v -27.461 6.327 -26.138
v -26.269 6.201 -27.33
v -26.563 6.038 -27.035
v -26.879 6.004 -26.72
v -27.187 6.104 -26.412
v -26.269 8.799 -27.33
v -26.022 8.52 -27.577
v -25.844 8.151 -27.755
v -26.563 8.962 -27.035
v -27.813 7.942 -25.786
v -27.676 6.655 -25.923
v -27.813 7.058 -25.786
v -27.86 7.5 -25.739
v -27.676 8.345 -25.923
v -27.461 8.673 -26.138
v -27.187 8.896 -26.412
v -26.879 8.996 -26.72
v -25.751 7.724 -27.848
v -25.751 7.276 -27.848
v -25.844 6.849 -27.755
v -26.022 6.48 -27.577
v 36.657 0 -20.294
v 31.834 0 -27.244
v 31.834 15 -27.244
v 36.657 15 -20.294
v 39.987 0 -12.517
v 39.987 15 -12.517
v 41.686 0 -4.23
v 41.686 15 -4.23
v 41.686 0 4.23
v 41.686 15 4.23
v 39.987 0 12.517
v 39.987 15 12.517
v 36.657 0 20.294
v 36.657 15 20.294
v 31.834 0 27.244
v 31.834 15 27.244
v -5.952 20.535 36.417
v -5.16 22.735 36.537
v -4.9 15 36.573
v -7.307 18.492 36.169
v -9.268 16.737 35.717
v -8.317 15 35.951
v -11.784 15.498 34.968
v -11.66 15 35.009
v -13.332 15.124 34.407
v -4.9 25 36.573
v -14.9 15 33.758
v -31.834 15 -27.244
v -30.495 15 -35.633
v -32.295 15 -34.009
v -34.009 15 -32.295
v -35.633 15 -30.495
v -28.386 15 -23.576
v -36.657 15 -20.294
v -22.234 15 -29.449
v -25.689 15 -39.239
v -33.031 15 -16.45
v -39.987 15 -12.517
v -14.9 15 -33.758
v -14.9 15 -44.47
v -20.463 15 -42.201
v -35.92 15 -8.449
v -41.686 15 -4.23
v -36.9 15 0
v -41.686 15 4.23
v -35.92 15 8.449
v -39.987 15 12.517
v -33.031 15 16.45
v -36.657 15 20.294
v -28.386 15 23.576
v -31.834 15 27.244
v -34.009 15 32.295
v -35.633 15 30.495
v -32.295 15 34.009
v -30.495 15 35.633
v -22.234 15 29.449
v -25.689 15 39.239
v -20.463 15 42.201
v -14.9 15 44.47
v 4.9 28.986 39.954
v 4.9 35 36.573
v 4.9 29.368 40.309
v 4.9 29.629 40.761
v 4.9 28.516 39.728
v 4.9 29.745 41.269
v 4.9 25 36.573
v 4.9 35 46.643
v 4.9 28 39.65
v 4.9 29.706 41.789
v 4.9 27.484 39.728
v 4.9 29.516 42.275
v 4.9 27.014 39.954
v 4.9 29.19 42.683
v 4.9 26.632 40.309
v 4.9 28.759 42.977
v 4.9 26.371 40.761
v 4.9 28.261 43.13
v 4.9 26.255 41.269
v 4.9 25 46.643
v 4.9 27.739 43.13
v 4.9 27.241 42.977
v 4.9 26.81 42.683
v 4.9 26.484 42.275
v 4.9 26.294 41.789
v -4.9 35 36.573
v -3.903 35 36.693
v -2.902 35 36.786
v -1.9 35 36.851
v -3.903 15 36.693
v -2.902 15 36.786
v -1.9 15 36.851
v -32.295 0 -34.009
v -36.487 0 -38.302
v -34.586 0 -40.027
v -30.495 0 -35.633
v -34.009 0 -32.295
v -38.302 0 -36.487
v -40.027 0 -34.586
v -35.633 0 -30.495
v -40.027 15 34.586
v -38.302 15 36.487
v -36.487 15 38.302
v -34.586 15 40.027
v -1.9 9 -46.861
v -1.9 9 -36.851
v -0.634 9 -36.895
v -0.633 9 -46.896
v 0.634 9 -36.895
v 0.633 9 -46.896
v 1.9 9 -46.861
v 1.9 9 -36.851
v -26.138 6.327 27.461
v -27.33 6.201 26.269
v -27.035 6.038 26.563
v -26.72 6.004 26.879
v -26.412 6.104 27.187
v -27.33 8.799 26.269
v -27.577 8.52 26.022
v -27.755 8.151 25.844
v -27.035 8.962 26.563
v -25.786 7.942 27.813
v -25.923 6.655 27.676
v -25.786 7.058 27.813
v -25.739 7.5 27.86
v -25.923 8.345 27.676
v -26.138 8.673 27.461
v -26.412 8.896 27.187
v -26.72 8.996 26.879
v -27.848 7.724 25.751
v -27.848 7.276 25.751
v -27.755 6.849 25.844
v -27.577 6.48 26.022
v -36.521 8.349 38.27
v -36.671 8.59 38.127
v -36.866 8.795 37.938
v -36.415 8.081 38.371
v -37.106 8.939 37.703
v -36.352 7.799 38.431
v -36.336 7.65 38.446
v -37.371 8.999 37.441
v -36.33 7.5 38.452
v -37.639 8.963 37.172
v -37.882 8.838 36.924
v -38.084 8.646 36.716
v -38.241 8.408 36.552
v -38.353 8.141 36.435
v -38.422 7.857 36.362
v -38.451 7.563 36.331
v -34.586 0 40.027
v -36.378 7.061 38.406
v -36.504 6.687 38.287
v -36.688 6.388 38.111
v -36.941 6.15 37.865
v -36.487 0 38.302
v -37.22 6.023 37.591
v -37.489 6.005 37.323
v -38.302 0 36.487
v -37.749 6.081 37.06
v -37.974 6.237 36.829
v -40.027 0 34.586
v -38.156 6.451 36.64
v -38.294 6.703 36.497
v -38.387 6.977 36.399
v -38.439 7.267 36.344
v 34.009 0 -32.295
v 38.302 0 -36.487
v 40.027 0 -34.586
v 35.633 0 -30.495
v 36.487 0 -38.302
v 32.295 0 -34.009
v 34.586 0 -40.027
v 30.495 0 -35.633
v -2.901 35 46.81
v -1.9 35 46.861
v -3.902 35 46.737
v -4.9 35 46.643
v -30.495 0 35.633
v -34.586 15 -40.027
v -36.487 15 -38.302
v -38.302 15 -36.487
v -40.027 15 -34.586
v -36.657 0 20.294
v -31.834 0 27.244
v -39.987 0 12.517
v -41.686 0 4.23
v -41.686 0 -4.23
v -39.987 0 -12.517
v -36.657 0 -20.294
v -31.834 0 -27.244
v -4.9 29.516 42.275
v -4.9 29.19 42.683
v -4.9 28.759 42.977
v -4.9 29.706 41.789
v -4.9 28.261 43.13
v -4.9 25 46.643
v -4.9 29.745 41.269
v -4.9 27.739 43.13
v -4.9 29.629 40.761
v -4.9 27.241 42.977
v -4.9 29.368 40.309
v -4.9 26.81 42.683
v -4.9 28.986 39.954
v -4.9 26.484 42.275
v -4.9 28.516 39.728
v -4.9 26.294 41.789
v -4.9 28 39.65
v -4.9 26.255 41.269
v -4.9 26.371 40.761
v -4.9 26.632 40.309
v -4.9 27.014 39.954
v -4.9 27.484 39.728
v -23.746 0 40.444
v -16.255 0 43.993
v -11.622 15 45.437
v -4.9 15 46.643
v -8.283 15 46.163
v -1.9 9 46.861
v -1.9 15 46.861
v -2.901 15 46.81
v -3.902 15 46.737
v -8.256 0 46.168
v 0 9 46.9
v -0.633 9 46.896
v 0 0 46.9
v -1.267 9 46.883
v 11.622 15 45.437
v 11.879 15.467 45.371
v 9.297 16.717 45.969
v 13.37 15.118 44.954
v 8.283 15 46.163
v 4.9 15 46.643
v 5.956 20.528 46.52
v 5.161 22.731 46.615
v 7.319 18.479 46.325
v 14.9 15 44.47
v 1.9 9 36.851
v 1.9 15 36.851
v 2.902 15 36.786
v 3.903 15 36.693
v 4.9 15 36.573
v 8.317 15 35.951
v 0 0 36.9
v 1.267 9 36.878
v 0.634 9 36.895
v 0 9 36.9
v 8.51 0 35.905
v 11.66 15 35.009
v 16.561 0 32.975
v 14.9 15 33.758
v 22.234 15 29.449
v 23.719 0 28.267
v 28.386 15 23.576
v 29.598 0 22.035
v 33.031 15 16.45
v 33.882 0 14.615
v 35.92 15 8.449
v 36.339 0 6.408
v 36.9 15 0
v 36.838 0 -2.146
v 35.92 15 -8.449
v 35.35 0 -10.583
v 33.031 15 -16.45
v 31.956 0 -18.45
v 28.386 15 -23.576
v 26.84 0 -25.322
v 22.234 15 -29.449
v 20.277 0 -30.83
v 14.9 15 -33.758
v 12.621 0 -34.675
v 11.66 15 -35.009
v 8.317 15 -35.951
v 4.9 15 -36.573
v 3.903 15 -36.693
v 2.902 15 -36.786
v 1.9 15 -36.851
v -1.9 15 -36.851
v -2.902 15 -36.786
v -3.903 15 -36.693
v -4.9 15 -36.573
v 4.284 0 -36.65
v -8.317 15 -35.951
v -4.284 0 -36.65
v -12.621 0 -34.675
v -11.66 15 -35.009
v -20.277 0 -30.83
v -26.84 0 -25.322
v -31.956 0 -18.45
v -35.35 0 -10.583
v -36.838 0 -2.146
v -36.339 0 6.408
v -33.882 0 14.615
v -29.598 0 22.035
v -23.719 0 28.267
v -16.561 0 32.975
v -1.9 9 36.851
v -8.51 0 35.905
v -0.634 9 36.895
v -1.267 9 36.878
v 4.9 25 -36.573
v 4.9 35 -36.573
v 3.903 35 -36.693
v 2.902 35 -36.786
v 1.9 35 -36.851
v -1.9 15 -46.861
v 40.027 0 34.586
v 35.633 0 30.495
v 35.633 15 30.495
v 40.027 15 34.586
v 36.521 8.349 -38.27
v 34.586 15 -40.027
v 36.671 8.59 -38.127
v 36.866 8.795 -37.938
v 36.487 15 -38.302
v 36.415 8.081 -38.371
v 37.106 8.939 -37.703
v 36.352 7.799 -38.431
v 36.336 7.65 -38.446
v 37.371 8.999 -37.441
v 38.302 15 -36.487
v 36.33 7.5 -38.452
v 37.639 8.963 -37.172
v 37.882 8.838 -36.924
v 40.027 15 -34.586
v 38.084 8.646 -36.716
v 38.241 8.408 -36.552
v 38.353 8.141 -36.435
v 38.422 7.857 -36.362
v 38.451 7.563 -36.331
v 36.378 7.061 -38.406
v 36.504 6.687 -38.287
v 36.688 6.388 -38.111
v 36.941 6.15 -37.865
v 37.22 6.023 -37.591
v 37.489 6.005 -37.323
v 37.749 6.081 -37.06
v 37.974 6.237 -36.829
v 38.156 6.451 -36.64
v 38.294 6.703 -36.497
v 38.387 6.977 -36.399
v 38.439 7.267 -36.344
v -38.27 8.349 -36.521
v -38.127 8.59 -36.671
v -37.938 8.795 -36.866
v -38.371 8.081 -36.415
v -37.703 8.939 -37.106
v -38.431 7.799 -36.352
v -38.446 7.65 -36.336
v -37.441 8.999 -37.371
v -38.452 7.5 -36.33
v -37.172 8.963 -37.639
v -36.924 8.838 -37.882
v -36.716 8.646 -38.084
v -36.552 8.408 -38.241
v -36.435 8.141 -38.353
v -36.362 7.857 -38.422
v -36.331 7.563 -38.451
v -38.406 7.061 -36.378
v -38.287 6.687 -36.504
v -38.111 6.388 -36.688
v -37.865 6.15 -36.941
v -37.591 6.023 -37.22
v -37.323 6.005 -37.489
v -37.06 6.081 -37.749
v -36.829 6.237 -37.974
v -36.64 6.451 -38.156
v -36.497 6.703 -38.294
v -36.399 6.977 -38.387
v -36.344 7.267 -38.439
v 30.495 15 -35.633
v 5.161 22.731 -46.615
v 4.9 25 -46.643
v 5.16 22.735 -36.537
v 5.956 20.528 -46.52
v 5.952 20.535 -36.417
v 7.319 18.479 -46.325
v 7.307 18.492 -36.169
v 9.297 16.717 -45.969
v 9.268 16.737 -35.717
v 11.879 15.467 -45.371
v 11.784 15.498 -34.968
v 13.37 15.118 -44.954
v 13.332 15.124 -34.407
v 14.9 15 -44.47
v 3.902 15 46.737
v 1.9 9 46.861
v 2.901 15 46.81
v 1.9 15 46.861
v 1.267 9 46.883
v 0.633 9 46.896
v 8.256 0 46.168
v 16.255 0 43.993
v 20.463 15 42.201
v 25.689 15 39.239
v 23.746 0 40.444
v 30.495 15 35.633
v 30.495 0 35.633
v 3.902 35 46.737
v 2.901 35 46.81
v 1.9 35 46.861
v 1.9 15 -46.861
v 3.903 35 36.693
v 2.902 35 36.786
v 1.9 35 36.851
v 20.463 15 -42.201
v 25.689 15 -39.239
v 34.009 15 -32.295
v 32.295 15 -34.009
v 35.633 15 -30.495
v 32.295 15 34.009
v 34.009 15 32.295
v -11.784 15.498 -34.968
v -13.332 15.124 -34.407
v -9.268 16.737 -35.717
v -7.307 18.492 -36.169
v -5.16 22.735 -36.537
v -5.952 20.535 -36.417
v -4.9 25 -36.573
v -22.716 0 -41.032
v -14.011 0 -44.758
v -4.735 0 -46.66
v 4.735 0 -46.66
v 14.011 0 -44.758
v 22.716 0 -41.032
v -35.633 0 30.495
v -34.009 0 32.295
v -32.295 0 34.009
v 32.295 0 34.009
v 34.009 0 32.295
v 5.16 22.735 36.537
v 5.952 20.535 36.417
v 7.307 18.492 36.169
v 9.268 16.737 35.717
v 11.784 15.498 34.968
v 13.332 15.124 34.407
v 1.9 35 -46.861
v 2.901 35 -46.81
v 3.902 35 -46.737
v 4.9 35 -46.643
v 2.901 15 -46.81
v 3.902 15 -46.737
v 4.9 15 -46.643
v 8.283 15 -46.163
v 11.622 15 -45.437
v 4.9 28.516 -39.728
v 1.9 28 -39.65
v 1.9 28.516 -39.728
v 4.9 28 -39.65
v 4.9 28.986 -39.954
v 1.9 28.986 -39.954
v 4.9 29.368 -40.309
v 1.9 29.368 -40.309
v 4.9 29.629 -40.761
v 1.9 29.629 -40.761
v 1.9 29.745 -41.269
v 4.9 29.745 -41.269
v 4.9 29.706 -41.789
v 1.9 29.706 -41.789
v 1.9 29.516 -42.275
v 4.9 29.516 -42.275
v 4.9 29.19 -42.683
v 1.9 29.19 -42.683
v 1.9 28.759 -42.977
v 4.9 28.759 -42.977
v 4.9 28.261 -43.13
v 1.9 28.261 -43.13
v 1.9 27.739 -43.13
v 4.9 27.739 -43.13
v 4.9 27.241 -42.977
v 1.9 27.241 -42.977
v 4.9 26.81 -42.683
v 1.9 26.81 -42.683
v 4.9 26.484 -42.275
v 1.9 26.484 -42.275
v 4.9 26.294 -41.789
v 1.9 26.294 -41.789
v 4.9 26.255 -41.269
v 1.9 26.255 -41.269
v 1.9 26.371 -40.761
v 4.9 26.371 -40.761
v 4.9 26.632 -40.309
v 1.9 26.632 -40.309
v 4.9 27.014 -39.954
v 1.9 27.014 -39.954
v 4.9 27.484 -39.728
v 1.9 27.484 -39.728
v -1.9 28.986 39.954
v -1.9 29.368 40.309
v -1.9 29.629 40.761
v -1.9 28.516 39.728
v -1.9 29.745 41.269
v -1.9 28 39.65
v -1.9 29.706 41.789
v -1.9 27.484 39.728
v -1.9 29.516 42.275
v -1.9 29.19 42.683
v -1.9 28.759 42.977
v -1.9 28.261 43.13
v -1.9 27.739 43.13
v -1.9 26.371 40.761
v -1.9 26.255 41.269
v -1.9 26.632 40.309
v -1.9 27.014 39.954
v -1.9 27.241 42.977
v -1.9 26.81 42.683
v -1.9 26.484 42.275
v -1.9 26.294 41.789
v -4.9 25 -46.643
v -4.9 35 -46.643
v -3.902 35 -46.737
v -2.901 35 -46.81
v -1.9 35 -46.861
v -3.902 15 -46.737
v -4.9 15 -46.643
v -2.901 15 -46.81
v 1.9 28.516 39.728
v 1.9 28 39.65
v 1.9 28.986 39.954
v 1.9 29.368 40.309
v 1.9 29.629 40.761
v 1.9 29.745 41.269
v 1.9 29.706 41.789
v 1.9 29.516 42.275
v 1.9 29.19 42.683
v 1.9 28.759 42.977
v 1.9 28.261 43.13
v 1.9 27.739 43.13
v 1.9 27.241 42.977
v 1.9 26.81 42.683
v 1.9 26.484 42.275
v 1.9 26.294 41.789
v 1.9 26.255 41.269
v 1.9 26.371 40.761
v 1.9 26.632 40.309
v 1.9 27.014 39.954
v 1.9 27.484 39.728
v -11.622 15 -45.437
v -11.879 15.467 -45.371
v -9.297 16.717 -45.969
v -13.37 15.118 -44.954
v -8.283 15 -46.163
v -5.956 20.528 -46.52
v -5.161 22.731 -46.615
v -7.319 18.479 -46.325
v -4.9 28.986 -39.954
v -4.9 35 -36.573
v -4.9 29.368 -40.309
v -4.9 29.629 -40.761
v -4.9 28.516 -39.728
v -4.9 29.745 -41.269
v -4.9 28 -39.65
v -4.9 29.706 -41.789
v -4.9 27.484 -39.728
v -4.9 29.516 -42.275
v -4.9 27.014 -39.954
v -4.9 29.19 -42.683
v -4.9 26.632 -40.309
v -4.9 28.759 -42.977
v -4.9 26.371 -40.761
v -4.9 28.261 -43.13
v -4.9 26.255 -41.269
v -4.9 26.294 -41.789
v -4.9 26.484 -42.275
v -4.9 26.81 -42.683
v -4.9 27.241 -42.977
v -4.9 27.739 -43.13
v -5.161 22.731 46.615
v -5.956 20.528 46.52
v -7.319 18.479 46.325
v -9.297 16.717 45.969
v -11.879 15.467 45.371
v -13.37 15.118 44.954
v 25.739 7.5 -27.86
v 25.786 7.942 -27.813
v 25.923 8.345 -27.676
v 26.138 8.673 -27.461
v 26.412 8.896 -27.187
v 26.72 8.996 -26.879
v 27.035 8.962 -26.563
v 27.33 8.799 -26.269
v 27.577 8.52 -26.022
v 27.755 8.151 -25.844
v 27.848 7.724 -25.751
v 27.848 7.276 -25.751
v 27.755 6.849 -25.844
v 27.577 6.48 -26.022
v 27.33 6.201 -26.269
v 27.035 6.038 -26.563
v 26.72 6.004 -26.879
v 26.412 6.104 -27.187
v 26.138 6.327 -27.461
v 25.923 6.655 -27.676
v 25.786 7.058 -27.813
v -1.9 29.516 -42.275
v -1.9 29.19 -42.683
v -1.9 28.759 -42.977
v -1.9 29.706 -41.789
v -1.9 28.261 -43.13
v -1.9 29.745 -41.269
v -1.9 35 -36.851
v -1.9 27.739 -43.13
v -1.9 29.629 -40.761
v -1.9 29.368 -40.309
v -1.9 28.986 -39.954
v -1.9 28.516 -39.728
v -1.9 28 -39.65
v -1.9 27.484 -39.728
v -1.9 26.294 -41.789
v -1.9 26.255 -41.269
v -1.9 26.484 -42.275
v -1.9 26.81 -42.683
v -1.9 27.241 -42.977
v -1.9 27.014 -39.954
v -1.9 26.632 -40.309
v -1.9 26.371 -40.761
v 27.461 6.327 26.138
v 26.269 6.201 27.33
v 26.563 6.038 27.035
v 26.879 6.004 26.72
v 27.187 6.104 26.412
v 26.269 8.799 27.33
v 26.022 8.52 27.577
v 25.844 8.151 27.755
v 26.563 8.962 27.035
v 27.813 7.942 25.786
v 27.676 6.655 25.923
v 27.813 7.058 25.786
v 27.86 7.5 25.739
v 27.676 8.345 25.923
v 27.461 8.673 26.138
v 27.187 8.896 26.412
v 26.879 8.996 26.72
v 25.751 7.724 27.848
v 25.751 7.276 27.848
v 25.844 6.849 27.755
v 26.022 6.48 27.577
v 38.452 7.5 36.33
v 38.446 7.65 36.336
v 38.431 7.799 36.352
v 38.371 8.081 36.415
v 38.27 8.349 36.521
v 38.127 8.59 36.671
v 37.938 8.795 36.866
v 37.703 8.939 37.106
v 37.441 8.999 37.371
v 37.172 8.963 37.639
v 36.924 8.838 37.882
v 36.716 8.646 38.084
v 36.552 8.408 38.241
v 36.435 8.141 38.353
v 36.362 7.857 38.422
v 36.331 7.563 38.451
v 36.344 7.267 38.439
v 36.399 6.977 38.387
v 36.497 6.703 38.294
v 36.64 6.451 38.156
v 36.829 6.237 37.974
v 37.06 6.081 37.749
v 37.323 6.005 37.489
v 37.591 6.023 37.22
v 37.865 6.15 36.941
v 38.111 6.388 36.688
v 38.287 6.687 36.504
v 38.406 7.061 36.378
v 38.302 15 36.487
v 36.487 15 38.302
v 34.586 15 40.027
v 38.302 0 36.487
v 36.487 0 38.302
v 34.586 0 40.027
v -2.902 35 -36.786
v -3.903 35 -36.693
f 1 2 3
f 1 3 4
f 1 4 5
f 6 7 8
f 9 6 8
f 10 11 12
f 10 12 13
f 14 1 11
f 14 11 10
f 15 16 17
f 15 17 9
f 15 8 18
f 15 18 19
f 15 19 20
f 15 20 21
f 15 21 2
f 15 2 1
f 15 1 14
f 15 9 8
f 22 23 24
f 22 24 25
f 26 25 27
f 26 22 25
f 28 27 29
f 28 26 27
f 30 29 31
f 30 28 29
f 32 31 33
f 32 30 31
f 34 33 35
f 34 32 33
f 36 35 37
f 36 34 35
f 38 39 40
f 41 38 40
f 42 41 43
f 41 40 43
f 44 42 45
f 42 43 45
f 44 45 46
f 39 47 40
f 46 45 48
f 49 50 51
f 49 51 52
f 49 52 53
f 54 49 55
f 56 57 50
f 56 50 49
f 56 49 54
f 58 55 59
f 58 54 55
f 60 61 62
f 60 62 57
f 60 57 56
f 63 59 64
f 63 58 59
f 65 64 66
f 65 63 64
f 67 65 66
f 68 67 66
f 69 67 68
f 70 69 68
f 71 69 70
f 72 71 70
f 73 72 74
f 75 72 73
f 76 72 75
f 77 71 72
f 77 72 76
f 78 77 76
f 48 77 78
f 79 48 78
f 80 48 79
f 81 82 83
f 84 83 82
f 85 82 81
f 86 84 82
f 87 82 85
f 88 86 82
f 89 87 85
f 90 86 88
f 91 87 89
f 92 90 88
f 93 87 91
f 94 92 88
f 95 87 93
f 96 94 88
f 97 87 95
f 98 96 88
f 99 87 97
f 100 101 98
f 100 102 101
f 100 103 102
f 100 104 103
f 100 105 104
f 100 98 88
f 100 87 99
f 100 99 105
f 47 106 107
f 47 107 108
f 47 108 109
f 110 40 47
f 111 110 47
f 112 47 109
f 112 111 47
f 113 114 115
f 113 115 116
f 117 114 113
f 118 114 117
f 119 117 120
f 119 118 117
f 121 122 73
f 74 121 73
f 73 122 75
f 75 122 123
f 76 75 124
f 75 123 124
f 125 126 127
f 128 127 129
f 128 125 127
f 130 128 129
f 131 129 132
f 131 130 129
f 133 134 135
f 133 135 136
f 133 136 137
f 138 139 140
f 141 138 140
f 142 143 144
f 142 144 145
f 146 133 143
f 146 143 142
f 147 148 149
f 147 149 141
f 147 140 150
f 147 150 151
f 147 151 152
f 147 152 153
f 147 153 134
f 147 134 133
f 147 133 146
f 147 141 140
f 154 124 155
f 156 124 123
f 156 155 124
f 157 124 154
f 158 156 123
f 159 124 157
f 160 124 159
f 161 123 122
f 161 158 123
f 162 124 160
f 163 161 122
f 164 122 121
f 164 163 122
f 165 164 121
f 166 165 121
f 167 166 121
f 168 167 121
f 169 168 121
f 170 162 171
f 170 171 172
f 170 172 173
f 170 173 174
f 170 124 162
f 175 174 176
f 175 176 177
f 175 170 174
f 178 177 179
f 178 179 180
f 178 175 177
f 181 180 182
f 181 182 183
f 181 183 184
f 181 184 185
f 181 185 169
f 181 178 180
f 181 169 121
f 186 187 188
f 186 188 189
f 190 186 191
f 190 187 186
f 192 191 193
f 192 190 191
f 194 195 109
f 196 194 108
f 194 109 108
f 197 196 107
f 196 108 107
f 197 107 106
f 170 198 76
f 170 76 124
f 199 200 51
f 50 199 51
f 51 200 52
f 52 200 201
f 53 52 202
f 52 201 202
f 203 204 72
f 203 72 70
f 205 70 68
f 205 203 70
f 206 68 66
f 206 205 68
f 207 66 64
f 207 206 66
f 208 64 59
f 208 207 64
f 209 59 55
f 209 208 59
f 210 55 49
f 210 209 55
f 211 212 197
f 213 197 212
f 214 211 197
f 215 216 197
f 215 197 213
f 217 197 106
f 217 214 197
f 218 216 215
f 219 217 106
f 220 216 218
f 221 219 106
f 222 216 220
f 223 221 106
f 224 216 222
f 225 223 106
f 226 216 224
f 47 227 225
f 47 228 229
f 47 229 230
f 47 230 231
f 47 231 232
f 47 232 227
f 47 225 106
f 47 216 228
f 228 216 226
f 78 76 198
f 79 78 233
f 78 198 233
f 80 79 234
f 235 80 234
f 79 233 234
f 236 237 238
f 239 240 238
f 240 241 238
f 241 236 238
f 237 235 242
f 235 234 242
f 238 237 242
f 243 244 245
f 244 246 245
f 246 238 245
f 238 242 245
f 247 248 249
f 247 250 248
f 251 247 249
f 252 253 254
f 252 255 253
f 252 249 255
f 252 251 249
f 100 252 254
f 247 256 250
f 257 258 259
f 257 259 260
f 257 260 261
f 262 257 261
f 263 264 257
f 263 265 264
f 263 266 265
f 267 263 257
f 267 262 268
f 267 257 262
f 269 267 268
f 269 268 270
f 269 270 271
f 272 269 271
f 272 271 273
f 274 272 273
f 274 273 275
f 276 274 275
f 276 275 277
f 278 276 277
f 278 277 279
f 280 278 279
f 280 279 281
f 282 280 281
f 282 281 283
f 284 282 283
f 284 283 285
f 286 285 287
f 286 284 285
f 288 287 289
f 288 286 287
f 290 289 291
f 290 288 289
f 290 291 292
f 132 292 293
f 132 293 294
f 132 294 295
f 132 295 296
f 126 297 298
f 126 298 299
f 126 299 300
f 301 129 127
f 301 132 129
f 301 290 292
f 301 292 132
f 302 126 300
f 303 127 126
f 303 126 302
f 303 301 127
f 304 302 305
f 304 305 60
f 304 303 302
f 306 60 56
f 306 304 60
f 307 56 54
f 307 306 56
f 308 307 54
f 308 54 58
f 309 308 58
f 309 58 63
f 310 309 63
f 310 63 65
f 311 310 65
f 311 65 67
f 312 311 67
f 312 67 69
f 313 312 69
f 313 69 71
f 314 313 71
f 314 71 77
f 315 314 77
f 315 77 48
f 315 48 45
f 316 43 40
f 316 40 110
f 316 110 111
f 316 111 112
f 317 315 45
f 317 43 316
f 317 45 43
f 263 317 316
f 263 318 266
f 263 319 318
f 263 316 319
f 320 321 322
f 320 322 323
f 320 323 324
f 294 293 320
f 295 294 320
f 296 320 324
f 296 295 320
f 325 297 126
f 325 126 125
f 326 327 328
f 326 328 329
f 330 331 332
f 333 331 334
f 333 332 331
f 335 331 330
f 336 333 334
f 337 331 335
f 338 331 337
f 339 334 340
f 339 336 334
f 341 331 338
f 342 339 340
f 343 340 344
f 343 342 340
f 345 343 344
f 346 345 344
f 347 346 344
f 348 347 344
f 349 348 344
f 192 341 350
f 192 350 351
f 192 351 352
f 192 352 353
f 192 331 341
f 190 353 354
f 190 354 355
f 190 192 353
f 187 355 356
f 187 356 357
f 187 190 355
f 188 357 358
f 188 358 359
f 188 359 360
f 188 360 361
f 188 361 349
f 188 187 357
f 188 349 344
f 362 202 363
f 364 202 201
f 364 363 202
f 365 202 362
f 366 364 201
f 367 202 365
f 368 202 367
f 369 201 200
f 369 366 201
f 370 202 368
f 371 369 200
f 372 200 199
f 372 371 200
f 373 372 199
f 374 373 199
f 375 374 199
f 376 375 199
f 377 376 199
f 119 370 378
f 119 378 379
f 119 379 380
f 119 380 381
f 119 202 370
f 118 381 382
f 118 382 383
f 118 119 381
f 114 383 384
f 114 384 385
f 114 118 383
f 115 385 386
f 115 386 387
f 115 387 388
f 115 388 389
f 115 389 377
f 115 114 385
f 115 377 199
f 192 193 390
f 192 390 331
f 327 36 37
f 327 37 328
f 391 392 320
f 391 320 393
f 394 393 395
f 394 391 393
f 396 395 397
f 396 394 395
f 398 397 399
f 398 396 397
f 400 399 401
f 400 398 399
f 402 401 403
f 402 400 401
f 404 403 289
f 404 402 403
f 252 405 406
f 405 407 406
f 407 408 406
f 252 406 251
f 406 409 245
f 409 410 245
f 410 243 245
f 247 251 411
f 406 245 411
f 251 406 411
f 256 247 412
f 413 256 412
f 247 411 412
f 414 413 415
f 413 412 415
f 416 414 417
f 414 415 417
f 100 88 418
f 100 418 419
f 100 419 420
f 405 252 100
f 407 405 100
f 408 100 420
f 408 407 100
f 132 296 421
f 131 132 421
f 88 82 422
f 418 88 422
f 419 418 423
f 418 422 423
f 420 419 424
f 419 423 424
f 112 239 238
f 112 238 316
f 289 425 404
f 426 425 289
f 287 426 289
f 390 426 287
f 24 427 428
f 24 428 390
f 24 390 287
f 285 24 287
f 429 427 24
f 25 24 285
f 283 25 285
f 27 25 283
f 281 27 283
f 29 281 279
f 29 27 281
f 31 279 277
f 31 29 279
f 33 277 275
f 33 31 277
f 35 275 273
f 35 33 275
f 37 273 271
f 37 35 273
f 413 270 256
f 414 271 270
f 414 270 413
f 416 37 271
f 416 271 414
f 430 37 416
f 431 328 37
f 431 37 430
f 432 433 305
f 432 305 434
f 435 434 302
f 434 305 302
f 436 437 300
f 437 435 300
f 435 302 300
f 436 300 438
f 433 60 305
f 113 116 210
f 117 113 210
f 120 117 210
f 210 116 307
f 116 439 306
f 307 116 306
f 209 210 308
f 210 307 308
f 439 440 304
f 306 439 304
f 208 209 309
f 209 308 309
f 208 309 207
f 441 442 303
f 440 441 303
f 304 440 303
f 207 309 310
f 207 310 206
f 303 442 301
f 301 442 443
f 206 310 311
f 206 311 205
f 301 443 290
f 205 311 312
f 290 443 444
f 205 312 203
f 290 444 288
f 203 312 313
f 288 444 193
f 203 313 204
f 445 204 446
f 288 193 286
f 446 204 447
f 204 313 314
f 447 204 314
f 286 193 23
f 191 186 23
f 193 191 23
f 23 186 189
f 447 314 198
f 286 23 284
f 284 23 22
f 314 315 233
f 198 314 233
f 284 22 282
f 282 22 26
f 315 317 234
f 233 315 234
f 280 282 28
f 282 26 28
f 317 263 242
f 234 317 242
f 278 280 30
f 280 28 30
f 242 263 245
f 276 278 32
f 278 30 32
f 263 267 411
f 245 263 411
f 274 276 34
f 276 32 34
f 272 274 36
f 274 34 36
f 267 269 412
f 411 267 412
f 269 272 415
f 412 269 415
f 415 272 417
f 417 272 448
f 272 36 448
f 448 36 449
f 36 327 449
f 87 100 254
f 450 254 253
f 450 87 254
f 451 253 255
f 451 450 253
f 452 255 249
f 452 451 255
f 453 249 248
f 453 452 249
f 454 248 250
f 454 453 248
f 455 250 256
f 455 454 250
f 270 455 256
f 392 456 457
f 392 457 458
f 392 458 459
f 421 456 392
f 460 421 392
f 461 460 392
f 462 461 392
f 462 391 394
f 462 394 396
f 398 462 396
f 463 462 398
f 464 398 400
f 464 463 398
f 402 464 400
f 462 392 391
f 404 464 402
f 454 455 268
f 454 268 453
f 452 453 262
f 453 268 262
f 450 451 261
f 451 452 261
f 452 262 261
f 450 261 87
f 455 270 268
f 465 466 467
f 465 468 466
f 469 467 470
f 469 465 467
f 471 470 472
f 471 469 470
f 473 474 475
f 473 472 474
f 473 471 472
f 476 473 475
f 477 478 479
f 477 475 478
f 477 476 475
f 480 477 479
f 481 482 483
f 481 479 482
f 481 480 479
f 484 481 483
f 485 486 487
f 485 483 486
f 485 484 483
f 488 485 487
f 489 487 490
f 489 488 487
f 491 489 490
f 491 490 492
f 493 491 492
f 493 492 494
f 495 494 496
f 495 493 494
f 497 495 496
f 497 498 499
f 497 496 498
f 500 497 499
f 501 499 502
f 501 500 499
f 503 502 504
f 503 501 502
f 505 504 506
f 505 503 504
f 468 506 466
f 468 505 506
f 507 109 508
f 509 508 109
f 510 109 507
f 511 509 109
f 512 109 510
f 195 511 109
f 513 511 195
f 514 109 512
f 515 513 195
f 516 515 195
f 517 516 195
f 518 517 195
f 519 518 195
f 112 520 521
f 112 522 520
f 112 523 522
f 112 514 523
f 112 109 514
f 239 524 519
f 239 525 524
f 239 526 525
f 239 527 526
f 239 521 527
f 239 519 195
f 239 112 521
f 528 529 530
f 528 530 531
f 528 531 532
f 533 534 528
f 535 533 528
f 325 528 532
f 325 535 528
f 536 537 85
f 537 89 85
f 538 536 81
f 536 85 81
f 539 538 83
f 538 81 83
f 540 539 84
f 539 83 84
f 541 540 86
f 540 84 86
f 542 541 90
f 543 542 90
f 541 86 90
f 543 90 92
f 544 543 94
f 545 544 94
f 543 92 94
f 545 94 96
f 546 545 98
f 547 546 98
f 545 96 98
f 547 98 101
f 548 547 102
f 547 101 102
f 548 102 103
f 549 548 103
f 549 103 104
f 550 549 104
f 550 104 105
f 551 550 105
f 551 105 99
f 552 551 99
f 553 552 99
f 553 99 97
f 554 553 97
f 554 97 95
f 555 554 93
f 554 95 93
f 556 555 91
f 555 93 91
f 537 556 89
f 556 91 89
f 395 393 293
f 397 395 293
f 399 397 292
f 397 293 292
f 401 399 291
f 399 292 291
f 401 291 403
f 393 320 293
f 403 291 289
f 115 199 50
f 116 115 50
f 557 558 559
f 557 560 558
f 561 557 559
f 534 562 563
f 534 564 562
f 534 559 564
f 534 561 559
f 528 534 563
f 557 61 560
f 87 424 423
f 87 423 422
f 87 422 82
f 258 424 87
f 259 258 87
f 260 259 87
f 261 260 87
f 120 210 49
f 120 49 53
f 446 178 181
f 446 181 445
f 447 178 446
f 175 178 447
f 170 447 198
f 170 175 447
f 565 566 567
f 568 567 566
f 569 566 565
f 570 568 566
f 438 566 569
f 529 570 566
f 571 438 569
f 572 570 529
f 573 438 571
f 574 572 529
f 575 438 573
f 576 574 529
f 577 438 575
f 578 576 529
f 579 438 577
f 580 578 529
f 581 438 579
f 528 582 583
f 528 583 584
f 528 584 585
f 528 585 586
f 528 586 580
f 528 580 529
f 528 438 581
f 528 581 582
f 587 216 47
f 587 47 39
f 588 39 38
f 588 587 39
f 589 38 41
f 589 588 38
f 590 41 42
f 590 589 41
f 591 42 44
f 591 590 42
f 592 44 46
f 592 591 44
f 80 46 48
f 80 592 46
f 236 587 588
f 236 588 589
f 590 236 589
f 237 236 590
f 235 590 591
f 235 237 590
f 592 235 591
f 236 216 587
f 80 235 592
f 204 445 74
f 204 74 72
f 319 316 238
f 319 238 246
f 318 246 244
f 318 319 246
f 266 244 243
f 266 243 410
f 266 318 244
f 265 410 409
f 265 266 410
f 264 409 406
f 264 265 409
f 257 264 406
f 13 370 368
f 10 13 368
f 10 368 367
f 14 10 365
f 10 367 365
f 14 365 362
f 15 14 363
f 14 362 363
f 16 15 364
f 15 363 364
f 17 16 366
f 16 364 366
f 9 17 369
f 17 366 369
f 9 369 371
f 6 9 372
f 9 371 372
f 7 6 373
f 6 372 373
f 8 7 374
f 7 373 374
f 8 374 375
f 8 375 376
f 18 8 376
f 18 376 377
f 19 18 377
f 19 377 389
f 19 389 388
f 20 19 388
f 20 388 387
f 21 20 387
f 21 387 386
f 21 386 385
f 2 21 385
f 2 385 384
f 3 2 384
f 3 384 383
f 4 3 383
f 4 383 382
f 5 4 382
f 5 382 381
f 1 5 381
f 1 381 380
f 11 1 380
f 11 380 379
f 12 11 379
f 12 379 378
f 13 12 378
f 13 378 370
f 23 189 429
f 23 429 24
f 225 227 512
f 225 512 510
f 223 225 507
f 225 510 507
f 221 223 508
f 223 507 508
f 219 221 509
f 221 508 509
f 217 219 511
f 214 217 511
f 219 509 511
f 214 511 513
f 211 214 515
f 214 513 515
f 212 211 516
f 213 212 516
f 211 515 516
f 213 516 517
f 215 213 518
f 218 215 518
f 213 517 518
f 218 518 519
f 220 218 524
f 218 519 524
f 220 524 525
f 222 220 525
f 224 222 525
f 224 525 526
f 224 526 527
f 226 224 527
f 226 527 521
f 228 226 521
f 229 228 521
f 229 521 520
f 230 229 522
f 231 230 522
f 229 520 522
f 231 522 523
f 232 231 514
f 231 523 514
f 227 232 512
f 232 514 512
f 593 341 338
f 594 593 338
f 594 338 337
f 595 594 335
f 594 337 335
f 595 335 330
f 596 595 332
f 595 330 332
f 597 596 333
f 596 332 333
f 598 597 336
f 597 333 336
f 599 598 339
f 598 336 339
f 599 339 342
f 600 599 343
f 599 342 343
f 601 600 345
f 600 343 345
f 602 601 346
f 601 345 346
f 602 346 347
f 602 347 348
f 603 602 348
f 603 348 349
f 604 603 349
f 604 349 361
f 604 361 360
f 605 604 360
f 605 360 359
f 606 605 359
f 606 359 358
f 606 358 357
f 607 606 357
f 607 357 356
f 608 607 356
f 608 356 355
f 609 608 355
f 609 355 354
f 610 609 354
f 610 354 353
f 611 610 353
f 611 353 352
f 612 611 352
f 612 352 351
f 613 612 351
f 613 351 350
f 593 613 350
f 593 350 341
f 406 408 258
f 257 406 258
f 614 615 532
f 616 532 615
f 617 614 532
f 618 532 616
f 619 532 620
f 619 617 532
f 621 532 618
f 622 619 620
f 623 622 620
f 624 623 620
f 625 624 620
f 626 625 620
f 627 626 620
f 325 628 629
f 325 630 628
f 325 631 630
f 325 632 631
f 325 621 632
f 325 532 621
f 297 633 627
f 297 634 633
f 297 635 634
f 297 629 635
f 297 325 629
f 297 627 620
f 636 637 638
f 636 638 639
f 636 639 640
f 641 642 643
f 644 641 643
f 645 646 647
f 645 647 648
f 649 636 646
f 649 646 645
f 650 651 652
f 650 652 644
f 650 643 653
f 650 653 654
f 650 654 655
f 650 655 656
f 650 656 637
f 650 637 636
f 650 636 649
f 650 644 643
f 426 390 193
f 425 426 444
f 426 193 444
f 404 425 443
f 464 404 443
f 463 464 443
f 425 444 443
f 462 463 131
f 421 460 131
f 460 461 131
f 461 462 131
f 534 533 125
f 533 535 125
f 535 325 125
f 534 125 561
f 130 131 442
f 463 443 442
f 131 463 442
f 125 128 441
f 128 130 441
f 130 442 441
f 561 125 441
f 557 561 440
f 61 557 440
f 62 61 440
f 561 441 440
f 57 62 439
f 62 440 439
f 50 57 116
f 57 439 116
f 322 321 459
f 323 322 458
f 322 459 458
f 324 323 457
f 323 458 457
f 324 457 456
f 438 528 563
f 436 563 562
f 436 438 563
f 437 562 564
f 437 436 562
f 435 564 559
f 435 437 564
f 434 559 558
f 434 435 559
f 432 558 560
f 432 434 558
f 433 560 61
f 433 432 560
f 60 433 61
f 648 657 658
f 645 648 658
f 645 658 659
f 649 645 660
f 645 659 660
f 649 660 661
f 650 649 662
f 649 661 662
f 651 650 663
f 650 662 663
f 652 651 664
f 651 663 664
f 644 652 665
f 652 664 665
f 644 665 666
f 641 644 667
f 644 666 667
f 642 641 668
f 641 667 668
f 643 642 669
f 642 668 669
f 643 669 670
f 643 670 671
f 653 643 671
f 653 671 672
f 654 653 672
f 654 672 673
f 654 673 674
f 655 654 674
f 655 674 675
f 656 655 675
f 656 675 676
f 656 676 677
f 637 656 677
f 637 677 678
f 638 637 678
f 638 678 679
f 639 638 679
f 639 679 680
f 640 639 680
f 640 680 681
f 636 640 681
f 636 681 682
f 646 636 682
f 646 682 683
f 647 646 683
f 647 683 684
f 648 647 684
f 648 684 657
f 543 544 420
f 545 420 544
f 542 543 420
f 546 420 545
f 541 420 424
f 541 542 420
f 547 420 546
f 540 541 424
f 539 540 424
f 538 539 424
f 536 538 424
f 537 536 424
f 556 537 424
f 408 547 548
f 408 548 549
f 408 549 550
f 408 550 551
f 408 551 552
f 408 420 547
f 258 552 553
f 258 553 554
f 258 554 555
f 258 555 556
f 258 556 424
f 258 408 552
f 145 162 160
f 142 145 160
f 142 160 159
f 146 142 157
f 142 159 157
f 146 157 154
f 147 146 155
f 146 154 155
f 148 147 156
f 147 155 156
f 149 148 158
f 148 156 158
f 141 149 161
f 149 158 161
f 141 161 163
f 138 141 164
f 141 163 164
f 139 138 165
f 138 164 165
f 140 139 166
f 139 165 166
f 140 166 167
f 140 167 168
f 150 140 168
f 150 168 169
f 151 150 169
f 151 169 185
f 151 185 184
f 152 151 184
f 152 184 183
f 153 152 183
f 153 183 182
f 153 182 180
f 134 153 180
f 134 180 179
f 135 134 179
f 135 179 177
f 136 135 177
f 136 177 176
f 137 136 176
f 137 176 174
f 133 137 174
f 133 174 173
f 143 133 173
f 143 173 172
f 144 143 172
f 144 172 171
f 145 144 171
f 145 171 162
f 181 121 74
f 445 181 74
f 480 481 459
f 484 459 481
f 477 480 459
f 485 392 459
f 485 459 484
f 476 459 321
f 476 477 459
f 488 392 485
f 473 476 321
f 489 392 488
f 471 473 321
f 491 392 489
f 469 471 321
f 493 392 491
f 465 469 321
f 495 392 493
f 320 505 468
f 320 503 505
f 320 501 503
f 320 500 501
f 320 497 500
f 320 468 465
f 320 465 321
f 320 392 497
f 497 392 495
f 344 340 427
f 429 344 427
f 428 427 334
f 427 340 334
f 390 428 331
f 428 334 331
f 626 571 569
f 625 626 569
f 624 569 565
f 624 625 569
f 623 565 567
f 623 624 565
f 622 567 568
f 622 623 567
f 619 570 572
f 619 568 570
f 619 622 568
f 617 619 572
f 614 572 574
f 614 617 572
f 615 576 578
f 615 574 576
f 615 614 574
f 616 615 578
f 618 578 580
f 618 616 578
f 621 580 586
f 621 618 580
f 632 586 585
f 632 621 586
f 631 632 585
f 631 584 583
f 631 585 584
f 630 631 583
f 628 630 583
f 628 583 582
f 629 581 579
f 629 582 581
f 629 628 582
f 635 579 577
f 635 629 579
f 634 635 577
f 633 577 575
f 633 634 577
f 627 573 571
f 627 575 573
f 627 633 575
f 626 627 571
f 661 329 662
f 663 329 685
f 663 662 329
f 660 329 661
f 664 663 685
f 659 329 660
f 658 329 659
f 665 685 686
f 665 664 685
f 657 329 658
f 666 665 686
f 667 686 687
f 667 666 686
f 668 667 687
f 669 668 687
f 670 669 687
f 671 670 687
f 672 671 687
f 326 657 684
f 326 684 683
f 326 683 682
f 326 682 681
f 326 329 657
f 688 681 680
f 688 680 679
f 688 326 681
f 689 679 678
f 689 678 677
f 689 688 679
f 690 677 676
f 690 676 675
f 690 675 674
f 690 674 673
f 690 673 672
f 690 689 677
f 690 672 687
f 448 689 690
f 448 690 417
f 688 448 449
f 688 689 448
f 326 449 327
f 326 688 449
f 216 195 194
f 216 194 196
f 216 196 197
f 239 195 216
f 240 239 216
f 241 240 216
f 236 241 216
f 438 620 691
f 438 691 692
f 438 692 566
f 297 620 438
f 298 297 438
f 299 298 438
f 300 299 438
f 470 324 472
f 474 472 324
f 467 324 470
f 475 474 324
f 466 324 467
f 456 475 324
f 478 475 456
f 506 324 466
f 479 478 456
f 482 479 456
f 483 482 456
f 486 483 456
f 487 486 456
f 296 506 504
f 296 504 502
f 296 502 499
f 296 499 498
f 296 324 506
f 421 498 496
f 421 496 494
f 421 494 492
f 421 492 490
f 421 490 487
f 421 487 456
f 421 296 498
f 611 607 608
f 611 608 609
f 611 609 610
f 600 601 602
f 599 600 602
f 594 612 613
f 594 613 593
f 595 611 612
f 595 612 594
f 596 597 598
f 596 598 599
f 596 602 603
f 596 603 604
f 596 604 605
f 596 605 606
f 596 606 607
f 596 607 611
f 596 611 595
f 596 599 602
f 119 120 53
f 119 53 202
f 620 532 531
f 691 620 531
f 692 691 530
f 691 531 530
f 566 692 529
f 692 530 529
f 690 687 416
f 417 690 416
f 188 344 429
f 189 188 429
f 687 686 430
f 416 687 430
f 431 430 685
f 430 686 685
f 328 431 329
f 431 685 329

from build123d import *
from build123d.topology import SkipClean

# Parameters (mm, degrees)
SKETCH1_R           = 46.9
SKETCH1_R_2         = 36.9
BOSS_EXTRUDE1_DEPTH = 15
BOSS_EXTRUDE2_DEPTH = 20
SKETCH4_W           = 3.8
SKETCH4_H           = 13.672543204
CUT_EXTRUDE2_DEPTH  = 6
SKETCH5_R           = 1.75
CUT_EXTRUDE3_DEPTH  = 75.99479982
FILLET3_R           = 10
BOSS_EXTRUDE3_DEPTH = 15
SKETCH9_R           = 1.5
CUT_EXTRUDE4_DEPTH  = 15
CIRPATTERN1_COUNT   = 4
CUT_EXTRUDE5_DEPTH  = 15


with BuildPart() as part:
    # Sketch1 → Boss-Extrude1 (new body)
    with BuildSketch(Plane(origin=(0, 0, 0), x_dir=(1, 0, 0), z_dir=(0, 1, 0))):
        with Locations(Location((0, 0, 0), (0, 0, 270))):
            Circle(SKETCH1_R)
        with Locations(Location((0, 0, 0), (0, 0, 270))):
            Circle(SKETCH1_R_2, mode=Mode.SUBTRACT)
    extrude(amount=BOSS_EXTRUDE1_DEPTH)

    # Sketch7 → Boss-Extrude2 (add)
    with SkipClean():  # the faces are left unmerged after this step: merging them gives an invalid solid
        with BuildSketch(Plane(origin=(0, 15, 0), x_dir=(1, 0, 0), z_dir=(0, 1, 0))):
            with BuildLine():
                Line((-1.9, 46.861498055), (-1.9, 36.851051545))
                ThreePointArc((-1.9, 36.851051545), (-3.402836815, 36.742763935), (-4.9, 36.573214242))
                Line((-4.9, 36.573214242), (-4.9, 46.643327497))
                ThreePointArc((-4.9, 46.643327497), (-3.401749491, 46.776469516), (-1.9, 46.861498055))
            make_face()
            with BuildLine():
                Line((4.9, 46.643327497), (4.9, 36.573214242))
                ThreePointArc((4.9, 36.573214242), (3.402836815, 36.742763935), (1.9, 36.851051545))
                Line((1.9, 36.851051545), (1.9, 46.861498055))
                ThreePointArc((1.9, 46.861498055), (3.401749491, 46.776469516), (4.9, 46.643327497))
            make_face()
            with BuildLine():
                Line((1.9, -46.861498055), (1.9, -36.851051545))
                ThreePointArc((1.9, -36.851051545), (3.402836815, -36.742763935), (4.9, -36.573214242))
                Line((4.9, -36.573214242), (4.9, -46.643327497))
                ThreePointArc((4.9, -46.643327497), (3.401749491, -46.776469516), (1.9, -46.861498055))
            make_face()
            with BuildLine():
                Line((-4.9, -46.643327497), (-4.9, -36.573214242))
                ThreePointArc((-4.9, -36.573214242), (-3.402836815, -36.742763935), (-1.9, -36.851051545))
                Line((-1.9, -36.851051545), (-1.9, -46.861498055))
                ThreePointArc((-1.9, -46.861498055), (-3.401749491, -46.776469516), (-4.9, -46.643327497))
            make_face()
        extrude(amount=BOSS_EXTRUDE2_DEPTH)

    # Sketch4 → Cut-Extrude2 (cut)
    with SkipClean():  # the faces are left unmerged after this step: merging them gives an invalid solid
        with BuildSketch(Plane(origin=(0, 15, 0), x_dir=(1, 0, 0), z_dir=(0, 1, 0))):
            with Locations((0, 42.34115802)):
                Rectangle(SKETCH4_W, SKETCH4_H)
            with Locations((0, -42.34115802)):
                Rectangle(SKETCH4_W, SKETCH4_H)
        extrude(amount=-CUT_EXTRUDE2_DEPTH, mode=Mode.SUBTRACT)

    # Sketch5 → Cut-Extrude3 (cut, symmetric)
    with SkipClean():  # the faces are left unmerged after this step: merging them gives an invalid solid
        with BuildSketch(Plane(origin=(0, 0, 0), x_dir=(0, 0, -1), z_dir=(1, 0, 0))):
            with Locations((-41.4, 28)):
                Circle(SKETCH5_R)
        cut_extrude3 = extrude(amount=CUT_EXTRUDE3_DEPTH, both=True, mode=Mode.SUBTRACT)

    # Mirror1: Cut-Extrude3 across plane
    with SkipClean():  # the faces are left unmerged after this step: merging them gives an invalid solid
        add(cut_extrude3.mirror(Plane.XY), mode=Mode.SUBTRACT)

    # Fillet3
    # the kernel refuses this fillet: 10 mm, written as the material it adds along each edge
    with BuildSketch(Plane(origin=(-4.9, 15, -11.573214242), x_dir=(-1, 0, 0), z_dir=(0, 0, -1))) as fillet3_piece_1_section:
        with BuildLine():
            CenterArc((FILLET3_R, FILLET3_R), FILLET3_R, 180, 90)
            Line((0, FILLET3_R), (0, 0))
            Line((0, 0), (FILLET3_R, 0))
        make_face()
    fillet3_piece_1 = extrude(amount=60.070113255, mode=Mode.PRIVATE)
    fillet3_piece_1 = fillet3_piece_1 & Plane(origin=(0, 17.250849012, 0), x_dir=(0, 0, 1), z_dir=(0, -1, 0)) * Cylinder(46.9, 161, mode=Mode.PRIVATE)
    fillet3_piece_1 = fillet3_piece_1 - Plane(origin=(0, 17.250849012, 0), x_dir=(0, 0, 1), z_dir=(0, -1, 0)) * Cylinder(36.9, 161, mode=Mode.PRIVATE)
    with BuildSketch(Plane(origin=(4.9, 15, -71.643327497), x_dir=(1, 0, 0), z_dir=(0, 0, 1))) as fillet3_piece_2_section:
        with BuildLine():
            CenterArc((FILLET3_R, FILLET3_R), FILLET3_R, 180, 90)
            Line((0, FILLET3_R), (0, 0))
            Line((0, 0), (FILLET3_R, 0))
        make_face()
    fillet3_piece_2 = extrude(amount=60.070113255, mode=Mode.PRIVATE)
    fillet3_piece_2 = fillet3_piece_2 & Plane(origin=(0, 17.250856037, 0), x_dir=(0, 0, 1), z_dir=(0, -1, 0)) * Cylinder(46.9, 161, mode=Mode.PRIVATE)
    fillet3_piece_2 = fillet3_piece_2 - Plane(origin=(0, 17.250856037, 0), x_dir=(0, 0, 1), z_dir=(0, -1, 0)) * Cylinder(36.9, 161, mode=Mode.PRIVATE)
    with BuildSketch(Plane(origin=(4.9, 15, 11.573214242), x_dir=(1, 0, 0), z_dir=(0, 0, 1))) as fillet3_piece_3_section:
        with BuildLine():
            CenterArc((FILLET3_R, FILLET3_R), FILLET3_R, 180, 90)
            Line((0, FILLET3_R), (0, 0))
            Line((0, 0), (FILLET3_R, 0))
        make_face()
    fillet3_piece_3 = extrude(amount=60.070113255, mode=Mode.PRIVATE)
    fillet3_piece_3 = fillet3_piece_3 & Plane(origin=(0, 17.250849012, 0), x_dir=(0, 0, 1), z_dir=(0, -1, 0)) * Cylinder(46.9, 161, mode=Mode.PRIVATE)
    fillet3_piece_3 = fillet3_piece_3 - Plane(origin=(0, 17.250849012, 0), x_dir=(0, 0, 1), z_dir=(0, -1, 0)) * Cylinder(36.9, 161, mode=Mode.PRIVATE)
    with BuildSketch(Plane(origin=(-4.9, 15, 71.643327497), x_dir=(-1, 0, 0), z_dir=(0, 0, -1))) as fillet3_piece_4_section:
        with BuildLine():
            CenterArc((FILLET3_R, FILLET3_R), FILLET3_R, 180, 90)
            Line((0, FILLET3_R), (0, 0))
            Line((0, 0), (FILLET3_R, 0))
        make_face()
    fillet3_piece_4 = extrude(amount=60.070113255, mode=Mode.PRIVATE)
    fillet3_piece_4 = fillet3_piece_4 & Plane(origin=(0, 17.250856037, 0), x_dir=(0, 0, 1), z_dir=(0, -1, 0)) * Cylinder(46.9, 161, mode=Mode.PRIVATE)
    fillet3_piece_4 = fillet3_piece_4 - Plane(origin=(0, 17.250856037, 0), x_dir=(0, 0, 1), z_dir=(0, -1, 0)) * Cylinder(36.9, 161, mode=Mode.PRIVATE)
    add([fillet3_piece_1, fillet3_piece_2, fillet3_piece_3, fillet3_piece_4])

    # Sketch8 → Boss-Extrude3 (add)
    with BuildSketch(Plane.XZ):
        with BuildLine():
            ThreePointArc((-35.632580164, 30.494741036), (-33.163308038, 33.163308038), (-30.494741036, 35.632580164))
            Line((-30.494741036, 35.632580164), (-34.586430477, 40.027350984))
            ThreePointArc((-34.586430477, 40.027350984), (-37.405948725, 37.405948725), (-40.027350984, 34.586430477))
            Line((-40.027350984, 34.586430477), (-35.632580164, 30.494741036))
        make_face()
    boss_extrude3 = extrude(amount=-BOSS_EXTRUDE3_DEPTH)

    # Sketch9 → Cut-Extrude4 (cut)
    with BuildSketch(Plane(origin=(-37.405948725, 0, 37.405948725), x_dir=(0, -1, 0), z_dir=(-0.7071067811865488, 0, 0.7071067811865464))):
        with Locations(Location((-7.5, 0, 0), (0, 0, 90))):
            Circle(SKETCH9_R)
    cut_extrude4 = extrude(amount=-CUT_EXTRUDE4_DEPTH, mode=Mode.SUBTRACT)

    # CirPattern1: Boss-Extrude3, Cut-Extrude4 ×4 about axis
    cirpattern1_axis = Axis((0, 0, 0), (0, 1, 0))
    add([boss_extrude3.rotate(cirpattern1_axis, i * 360 / CIRPATTERN1_COUNT) for i in range(1, CIRPATTERN1_COUNT)])
    add([cut_extrude4.rotate(cirpattern1_axis, i * 360 / CIRPATTERN1_COUNT) for i in range(1, CIRPATTERN1_COUNT)], mode=Mode.SUBTRACT)

    # Sketch10 → Cut-Extrude5 (cut)
    with BuildSketch(Plane.XZ):
        with BuildLine():
            Line((-35.632580164, 30.494741036), (-31.833797631, 27.243702546))
            ThreePointArc((-31.833797631, 27.243702546), (-41.9, 0), (-31.833797631, -27.243702546))
            Line((-31.833797631, -27.243702546), (-35.632580164, -30.494741036))
            ThreePointArc((-35.632580164, -30.494741036), (-46.9, 0), (-35.632580164, 30.494741036))
        make_face()
        with BuildLine():
            Line((35.632580164, -30.494741036), (31.833797631, -27.243702546))
            ThreePointArc((31.833797631, -27.243702546), (41.9, 0), (31.833797631, 27.243702546))
            Line((31.833797631, 27.243702546), (35.632580164, 30.494741036))
            ThreePointArc((35.632580164, 30.494741036), (46.9, 0), (35.632580164, -30.494741036))
        make_face()
    extrude(amount=-CUT_EXTRUDE5_DEPTH, mode=Mode.SUBTRACT)


solid = part.part
